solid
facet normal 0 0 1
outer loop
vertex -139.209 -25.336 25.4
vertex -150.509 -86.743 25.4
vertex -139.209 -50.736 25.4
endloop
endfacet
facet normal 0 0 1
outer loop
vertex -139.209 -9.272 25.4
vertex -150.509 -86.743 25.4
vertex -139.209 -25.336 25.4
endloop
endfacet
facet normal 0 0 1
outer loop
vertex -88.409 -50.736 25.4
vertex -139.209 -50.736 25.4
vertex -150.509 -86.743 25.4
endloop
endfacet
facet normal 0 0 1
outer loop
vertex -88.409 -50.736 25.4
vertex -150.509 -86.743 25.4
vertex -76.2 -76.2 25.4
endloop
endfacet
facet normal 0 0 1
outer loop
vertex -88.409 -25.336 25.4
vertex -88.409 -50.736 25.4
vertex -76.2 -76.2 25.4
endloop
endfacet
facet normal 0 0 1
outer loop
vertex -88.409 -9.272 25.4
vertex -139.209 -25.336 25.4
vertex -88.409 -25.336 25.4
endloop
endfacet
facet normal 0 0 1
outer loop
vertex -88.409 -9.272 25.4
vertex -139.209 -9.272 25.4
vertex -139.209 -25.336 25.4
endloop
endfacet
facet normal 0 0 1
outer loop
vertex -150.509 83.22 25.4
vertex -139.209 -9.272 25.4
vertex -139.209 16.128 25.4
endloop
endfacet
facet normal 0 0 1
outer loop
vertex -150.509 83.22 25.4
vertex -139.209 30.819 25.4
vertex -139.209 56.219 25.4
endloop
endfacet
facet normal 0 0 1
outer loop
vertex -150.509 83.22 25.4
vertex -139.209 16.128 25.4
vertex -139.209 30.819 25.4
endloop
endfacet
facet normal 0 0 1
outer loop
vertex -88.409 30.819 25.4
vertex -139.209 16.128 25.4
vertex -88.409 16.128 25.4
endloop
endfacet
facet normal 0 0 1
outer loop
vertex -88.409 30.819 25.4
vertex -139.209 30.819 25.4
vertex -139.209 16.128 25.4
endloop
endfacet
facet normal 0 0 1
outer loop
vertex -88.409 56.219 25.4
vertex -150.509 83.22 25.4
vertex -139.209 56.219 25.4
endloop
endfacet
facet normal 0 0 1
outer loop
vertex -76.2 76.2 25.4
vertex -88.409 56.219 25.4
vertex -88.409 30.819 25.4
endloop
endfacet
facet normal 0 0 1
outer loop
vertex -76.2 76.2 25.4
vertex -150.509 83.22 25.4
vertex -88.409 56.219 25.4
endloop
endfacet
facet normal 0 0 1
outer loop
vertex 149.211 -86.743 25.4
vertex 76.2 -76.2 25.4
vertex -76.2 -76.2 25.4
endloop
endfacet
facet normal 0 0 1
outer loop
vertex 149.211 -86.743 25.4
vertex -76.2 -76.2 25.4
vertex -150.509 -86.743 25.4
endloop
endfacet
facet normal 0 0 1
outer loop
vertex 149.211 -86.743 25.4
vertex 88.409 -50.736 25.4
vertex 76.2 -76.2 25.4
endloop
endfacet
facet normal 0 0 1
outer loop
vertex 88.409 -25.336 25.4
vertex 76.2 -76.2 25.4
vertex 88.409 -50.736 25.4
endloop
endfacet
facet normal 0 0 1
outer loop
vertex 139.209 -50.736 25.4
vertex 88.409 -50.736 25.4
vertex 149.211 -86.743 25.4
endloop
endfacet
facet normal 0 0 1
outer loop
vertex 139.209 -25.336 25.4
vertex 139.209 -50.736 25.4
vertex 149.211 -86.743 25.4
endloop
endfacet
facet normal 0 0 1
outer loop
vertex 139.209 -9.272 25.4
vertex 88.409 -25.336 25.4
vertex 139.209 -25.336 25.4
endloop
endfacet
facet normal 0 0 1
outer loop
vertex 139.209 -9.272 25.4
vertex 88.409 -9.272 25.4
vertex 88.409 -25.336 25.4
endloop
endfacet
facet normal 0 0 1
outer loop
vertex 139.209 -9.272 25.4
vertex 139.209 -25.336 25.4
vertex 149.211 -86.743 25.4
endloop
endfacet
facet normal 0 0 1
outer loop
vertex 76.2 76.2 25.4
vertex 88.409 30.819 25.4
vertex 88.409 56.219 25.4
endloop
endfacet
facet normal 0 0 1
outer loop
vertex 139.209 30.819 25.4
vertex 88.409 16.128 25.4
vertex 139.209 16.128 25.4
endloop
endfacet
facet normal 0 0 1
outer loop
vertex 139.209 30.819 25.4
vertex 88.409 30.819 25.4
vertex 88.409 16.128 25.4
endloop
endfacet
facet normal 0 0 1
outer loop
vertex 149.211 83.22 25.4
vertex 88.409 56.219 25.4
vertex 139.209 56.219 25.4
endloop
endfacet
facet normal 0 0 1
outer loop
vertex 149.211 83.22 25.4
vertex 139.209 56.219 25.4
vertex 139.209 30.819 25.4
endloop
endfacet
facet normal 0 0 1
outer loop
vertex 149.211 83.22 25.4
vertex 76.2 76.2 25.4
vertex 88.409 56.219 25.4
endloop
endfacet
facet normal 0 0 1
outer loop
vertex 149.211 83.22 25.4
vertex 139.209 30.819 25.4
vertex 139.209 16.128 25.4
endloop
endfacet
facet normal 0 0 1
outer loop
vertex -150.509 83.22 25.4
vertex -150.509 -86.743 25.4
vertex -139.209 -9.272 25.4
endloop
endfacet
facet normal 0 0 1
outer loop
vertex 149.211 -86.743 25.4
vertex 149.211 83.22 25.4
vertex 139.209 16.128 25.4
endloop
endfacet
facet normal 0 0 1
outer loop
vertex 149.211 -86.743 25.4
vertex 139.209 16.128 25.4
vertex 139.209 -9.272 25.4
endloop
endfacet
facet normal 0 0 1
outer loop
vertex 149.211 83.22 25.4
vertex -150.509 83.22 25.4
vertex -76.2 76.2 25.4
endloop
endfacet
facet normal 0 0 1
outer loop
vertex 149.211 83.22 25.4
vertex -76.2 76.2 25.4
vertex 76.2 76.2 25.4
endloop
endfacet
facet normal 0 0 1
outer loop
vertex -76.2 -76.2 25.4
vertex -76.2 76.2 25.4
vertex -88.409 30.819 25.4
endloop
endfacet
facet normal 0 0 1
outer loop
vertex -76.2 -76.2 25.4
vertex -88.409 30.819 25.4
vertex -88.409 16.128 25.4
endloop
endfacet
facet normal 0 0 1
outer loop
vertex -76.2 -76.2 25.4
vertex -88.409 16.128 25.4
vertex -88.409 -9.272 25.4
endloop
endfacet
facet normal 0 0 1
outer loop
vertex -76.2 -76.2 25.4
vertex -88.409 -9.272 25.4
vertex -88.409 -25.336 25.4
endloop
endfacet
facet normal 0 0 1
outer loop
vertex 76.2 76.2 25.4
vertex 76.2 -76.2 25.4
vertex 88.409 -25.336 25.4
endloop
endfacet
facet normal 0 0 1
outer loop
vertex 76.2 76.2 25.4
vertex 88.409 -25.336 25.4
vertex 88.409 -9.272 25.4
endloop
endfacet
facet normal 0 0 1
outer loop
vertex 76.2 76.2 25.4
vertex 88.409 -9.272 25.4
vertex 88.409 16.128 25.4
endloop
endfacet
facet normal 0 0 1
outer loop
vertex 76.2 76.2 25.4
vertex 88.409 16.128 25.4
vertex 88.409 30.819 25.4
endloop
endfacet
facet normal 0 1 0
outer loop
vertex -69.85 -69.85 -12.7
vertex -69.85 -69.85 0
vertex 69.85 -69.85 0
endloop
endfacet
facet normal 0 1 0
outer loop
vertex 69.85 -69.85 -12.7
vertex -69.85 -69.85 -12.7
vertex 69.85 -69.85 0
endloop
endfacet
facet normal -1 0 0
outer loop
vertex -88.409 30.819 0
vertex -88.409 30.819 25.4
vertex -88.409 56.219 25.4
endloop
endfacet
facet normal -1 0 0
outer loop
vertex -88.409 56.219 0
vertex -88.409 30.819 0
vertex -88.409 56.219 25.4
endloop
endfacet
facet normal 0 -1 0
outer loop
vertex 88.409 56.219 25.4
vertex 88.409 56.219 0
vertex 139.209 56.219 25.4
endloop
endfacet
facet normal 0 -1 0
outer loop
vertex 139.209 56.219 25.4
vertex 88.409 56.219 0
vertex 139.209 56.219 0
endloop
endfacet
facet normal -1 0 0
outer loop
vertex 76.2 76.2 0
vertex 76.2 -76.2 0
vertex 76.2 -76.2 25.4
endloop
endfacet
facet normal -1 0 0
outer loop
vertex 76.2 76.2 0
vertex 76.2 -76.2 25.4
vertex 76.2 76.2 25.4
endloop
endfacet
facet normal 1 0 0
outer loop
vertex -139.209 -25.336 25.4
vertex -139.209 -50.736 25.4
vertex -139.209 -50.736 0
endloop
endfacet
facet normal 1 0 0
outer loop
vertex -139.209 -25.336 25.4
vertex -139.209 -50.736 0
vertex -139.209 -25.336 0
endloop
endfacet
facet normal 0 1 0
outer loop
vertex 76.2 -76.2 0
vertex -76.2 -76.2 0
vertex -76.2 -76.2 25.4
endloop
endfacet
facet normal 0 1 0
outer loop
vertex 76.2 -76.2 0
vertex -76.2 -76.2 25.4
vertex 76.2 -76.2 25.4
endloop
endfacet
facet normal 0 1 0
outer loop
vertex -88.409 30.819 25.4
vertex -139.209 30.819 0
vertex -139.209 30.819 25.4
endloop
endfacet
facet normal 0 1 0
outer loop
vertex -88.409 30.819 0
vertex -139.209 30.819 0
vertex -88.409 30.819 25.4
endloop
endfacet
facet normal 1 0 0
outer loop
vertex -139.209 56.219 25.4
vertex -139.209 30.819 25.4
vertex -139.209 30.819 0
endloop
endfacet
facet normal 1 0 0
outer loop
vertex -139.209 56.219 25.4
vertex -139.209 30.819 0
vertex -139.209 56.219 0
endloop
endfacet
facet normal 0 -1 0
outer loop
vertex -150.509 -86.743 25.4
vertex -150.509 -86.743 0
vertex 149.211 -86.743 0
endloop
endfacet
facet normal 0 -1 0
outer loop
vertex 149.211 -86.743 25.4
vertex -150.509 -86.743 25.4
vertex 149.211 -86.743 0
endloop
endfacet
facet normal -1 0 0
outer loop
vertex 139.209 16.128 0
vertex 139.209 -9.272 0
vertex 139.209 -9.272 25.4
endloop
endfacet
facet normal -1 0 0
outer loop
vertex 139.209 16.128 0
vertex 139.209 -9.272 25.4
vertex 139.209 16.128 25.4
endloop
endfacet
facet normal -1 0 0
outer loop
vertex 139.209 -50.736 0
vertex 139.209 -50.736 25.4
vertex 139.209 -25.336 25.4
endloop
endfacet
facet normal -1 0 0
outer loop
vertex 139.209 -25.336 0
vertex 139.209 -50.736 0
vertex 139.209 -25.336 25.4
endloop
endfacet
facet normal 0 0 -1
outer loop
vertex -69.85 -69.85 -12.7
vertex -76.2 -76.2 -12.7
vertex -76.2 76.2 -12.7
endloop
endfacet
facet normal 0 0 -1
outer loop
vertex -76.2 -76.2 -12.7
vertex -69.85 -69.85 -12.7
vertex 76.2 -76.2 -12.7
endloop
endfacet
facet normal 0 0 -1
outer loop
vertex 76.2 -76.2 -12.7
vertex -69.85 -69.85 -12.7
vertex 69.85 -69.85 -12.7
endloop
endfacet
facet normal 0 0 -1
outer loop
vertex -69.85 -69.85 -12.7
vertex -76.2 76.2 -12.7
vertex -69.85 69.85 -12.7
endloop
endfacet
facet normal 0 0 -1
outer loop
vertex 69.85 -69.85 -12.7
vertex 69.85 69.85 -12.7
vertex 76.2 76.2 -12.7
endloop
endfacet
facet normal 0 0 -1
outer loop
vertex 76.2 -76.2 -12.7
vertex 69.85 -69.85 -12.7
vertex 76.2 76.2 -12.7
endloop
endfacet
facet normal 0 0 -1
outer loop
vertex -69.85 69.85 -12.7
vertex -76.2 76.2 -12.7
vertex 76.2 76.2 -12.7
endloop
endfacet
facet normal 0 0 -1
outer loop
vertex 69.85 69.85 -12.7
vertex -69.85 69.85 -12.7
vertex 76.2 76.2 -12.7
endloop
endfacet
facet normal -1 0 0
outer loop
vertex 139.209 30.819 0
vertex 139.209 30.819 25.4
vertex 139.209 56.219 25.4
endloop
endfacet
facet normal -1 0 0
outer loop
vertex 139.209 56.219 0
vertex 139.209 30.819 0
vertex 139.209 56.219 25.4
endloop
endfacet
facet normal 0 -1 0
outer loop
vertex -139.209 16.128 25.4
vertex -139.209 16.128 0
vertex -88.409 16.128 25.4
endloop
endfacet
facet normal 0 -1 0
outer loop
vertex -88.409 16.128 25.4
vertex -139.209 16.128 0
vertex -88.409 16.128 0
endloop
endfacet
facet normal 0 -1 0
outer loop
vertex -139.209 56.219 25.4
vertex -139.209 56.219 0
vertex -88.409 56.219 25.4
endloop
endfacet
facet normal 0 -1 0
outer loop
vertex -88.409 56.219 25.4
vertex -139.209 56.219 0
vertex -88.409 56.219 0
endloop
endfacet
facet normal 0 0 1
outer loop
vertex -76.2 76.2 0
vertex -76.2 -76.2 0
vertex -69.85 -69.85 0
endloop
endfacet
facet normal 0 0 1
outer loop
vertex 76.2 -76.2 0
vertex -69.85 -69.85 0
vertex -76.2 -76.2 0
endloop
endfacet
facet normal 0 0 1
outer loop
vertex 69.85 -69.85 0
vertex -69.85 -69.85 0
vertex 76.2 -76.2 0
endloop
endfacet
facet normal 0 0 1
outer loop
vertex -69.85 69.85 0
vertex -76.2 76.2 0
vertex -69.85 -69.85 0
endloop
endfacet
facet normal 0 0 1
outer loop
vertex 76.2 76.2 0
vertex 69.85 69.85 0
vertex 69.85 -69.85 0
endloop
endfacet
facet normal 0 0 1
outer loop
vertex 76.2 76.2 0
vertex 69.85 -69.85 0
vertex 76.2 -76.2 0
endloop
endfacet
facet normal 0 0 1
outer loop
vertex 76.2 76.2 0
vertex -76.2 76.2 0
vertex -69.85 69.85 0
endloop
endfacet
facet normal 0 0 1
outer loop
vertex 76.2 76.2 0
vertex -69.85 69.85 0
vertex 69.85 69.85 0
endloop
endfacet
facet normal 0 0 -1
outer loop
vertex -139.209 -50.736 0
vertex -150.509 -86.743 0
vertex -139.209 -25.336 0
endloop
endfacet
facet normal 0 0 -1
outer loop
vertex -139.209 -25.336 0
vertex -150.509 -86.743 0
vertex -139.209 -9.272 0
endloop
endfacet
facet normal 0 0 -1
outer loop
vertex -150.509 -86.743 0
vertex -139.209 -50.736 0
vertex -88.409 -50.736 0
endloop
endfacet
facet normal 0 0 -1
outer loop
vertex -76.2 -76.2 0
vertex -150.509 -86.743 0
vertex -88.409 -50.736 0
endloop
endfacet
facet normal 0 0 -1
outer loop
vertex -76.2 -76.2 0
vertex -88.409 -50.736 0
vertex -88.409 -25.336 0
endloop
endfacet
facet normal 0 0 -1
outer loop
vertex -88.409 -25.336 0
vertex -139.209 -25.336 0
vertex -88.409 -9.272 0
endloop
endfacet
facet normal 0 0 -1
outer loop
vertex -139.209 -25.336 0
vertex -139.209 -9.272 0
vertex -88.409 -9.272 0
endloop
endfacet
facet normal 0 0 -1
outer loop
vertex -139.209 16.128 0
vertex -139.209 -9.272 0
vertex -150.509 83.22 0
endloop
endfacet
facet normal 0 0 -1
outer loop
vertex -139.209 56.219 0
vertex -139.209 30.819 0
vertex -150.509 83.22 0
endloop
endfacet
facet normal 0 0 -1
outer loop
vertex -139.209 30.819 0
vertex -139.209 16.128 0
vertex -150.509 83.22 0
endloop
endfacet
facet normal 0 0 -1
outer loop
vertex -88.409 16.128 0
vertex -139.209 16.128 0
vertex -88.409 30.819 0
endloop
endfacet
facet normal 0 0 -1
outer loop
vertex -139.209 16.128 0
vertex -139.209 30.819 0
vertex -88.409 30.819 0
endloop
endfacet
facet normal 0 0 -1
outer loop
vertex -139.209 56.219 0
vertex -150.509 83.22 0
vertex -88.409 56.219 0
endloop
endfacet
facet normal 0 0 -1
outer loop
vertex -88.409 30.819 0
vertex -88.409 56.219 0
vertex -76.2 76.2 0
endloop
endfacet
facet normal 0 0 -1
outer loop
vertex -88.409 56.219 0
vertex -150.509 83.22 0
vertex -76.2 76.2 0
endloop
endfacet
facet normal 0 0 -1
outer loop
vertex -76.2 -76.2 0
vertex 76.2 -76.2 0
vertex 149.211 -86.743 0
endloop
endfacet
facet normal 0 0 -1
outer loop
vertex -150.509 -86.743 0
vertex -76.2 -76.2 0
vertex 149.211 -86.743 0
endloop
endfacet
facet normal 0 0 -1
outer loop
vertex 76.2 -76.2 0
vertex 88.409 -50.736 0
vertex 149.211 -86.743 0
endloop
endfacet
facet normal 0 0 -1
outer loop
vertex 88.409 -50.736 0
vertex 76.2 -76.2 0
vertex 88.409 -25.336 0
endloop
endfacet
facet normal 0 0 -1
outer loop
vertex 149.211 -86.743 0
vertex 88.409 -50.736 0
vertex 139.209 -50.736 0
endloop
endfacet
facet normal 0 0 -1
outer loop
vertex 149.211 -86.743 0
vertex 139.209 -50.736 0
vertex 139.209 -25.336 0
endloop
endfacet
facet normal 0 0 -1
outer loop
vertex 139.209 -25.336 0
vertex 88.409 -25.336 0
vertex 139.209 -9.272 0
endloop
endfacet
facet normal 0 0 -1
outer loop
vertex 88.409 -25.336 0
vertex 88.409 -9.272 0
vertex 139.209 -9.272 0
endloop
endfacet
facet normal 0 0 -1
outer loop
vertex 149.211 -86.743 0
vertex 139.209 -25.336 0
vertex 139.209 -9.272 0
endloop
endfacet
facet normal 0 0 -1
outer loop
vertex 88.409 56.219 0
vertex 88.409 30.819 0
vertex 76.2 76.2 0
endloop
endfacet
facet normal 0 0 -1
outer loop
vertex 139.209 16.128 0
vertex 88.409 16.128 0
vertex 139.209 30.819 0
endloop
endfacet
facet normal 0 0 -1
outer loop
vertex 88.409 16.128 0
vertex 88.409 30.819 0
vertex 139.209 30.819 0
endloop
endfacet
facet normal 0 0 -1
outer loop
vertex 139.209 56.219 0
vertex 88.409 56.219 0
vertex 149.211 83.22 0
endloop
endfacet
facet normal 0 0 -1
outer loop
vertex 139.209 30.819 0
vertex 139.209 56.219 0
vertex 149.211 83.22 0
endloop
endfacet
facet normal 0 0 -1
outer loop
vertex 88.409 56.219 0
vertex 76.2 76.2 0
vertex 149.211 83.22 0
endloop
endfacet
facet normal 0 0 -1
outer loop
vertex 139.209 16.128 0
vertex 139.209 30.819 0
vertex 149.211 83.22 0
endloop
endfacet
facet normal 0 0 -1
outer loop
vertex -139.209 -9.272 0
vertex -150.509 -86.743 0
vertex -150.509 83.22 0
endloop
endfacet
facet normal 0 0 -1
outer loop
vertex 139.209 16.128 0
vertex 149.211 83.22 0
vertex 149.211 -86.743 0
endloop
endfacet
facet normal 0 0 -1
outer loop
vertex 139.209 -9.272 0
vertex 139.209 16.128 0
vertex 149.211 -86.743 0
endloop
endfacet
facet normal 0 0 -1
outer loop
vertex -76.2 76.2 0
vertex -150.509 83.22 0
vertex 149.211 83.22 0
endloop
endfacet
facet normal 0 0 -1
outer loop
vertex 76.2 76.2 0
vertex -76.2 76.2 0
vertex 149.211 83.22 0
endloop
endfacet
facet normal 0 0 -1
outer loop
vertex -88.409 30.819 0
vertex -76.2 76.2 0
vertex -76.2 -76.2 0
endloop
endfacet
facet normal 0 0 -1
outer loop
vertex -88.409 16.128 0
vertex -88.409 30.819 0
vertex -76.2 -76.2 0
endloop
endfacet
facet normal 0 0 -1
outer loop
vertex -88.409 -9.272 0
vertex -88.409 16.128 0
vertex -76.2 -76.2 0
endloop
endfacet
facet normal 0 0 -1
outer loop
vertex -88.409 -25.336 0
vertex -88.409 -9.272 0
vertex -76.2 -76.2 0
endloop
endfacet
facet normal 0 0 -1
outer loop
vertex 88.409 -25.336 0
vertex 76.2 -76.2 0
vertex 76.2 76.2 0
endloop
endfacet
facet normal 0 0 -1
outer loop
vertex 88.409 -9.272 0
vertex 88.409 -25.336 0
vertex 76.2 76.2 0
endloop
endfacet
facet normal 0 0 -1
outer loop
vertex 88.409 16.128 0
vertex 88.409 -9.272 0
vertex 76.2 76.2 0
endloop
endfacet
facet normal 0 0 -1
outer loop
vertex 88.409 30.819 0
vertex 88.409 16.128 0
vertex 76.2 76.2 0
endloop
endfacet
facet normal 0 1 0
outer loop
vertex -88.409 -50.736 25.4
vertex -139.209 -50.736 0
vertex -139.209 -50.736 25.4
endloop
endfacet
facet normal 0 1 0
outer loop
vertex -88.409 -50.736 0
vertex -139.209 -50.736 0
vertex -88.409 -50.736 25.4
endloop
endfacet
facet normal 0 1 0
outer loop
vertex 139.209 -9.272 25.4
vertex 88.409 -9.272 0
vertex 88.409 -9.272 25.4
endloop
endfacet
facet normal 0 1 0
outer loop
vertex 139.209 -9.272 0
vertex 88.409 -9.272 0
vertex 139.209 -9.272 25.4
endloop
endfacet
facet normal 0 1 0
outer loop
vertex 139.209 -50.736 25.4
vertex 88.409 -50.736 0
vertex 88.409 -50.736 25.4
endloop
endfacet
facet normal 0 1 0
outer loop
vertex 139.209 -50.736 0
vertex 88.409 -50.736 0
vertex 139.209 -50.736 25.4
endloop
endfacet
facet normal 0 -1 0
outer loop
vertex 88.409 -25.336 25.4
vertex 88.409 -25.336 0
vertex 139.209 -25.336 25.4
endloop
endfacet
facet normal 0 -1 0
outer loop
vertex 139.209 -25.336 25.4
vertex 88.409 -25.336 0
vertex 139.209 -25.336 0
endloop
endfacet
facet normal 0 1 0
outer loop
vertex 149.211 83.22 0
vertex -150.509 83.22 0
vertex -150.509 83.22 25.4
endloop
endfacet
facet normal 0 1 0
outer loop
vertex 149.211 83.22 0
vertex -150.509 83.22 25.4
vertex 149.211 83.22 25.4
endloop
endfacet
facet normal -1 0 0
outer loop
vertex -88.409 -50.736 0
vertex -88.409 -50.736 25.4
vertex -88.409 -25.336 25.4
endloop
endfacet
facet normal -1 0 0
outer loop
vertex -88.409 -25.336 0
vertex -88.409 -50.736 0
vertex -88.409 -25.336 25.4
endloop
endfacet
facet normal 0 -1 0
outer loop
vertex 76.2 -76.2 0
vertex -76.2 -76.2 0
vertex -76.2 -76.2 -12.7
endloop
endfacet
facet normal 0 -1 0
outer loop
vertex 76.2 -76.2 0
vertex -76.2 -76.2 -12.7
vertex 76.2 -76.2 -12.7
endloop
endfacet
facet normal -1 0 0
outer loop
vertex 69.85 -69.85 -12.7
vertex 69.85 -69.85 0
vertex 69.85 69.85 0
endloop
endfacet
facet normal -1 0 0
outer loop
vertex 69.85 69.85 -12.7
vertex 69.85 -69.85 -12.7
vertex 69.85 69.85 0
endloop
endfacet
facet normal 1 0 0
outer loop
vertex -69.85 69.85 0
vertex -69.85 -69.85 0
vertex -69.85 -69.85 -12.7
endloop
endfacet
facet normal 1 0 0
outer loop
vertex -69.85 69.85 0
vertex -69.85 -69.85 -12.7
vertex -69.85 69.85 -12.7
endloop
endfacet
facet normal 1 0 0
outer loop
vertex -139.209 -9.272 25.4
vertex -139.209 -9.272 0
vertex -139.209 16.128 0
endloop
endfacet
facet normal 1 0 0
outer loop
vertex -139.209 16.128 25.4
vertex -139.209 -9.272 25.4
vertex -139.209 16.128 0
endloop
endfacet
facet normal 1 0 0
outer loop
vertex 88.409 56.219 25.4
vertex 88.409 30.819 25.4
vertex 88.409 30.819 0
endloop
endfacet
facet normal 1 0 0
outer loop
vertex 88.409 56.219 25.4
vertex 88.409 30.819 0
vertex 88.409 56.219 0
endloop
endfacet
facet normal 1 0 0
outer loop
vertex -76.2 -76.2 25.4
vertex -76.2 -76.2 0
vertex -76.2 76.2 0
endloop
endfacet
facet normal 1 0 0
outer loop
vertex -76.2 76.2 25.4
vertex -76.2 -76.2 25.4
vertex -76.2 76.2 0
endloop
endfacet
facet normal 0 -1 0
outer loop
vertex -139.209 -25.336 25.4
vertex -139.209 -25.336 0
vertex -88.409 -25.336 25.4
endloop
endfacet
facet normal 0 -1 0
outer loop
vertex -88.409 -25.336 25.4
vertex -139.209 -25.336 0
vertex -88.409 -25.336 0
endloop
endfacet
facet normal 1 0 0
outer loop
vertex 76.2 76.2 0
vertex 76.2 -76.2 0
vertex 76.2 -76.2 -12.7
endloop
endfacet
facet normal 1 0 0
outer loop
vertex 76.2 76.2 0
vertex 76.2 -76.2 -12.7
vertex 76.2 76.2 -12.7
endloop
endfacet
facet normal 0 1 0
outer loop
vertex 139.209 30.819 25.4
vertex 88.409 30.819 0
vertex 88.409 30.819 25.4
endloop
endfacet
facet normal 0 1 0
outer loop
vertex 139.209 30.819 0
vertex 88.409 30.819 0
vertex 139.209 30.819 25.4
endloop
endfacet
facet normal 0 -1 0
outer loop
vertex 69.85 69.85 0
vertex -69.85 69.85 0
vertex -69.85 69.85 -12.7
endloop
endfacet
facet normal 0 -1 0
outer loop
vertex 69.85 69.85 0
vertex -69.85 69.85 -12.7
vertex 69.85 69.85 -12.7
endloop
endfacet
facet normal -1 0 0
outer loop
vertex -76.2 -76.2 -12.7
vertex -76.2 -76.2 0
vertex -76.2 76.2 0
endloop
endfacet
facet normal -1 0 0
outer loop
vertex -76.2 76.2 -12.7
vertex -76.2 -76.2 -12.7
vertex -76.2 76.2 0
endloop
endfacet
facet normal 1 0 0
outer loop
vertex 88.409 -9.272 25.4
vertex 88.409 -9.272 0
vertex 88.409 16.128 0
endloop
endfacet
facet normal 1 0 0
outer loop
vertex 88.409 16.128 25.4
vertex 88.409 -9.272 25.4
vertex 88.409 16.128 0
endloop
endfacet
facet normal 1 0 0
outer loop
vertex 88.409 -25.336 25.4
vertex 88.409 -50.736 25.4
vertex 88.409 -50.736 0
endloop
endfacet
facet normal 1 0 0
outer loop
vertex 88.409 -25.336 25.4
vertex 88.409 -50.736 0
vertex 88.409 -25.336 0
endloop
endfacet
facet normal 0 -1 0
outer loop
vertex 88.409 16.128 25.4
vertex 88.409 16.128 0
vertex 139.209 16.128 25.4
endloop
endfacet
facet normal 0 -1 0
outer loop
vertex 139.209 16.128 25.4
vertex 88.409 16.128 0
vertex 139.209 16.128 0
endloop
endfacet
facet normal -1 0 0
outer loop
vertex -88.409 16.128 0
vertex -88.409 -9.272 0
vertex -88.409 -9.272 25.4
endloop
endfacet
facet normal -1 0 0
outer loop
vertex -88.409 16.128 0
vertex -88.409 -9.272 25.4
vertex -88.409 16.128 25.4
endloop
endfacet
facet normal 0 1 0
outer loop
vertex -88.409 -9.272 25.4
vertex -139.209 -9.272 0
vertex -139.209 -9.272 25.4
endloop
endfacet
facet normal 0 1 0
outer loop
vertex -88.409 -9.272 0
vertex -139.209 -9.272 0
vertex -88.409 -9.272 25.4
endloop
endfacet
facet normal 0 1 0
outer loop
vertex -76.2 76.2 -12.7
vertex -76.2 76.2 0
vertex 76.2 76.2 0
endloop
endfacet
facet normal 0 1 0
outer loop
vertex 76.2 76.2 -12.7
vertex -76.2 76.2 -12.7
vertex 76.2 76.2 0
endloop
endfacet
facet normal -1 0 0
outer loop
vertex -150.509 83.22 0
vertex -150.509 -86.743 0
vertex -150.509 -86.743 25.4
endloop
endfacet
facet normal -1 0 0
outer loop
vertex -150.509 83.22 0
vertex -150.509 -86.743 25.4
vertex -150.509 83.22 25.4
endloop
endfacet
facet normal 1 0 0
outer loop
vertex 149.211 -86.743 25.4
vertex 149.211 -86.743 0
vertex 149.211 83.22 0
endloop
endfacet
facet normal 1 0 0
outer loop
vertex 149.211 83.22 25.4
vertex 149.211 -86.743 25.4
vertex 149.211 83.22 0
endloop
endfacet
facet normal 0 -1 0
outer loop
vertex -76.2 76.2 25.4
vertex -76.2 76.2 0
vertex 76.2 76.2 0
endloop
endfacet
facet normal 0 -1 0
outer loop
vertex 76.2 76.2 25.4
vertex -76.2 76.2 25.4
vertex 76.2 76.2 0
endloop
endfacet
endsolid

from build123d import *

# Parameters (mm, degrees)
F0_W     = 299.72
F0_H     = 169.9631744818
F3_DEPTH = 25.4
F1_W     = 50.8
F1_H     = 25.4
F4_DEPTH = 25.4
F2_W     = 152.4
F2_H     = 152.4
F2_W_2   = 139.7
F2_H_2   = 139.7
F5_DEPTH = 25.4
F6_DEPTH = 12.7


# Not quite as in the source:
# - a feature of the source that left no trace in its solid (it failed there, or was rolled back) is left out


with BuildPart() as f3:
    # F0 (on Top) → F3 (new body)
    with BuildSketch(Plane.XY):
        with Locations((-0.6489809602, -1.7615165561)):
            Rectangle(F0_W, F0_H)
    extrude(amount=F3_DEPTH)

    # F1 (on face) → F4 (cut)
    with BuildSketch(Plane.XY):
        with Locations((113.8091359086, 43.5188937416)):
            Rectangle(F1_W, F1_H)
        with Locations((113.8091359086, 3.428083711)):
            Rectangle(F1_W, F1_H)
        with Locations((113.8091359086, -38.0356973421)):
            Rectangle(F1_W, F1_H)
        with Locations((-113.8091359086, 43.5188937416)):
            Rectangle(F1_W, F1_H)
        with Locations((-113.8091359086, 3.428083711)):
            Rectangle(F1_W, F1_H)
        with Locations((-113.8091359086, -38.0356973421)):
            Rectangle(F1_W, F1_H)
    extrude(amount=F4_DEPTH, mode=Mode.SUBTRACT)

    # F2 (on Top) → F5 (cut)
    with BuildSketch(Plane.XY):
        Rectangle(F2_W, F2_H)
        Rectangle(F2_W_2, F2_H_2, mode=Mode.SUBTRACT)
        Rectangle(F2_W_2, F2_H_2)
    extrude(amount=F5_DEPTH, mode=Mode.SUBTRACT)


with BuildPart() as f6:
    # F2 (on Top) → F6 (new body)
    with BuildSketch(Plane.XY):
        Rectangle(F2_W, F2_H)
        Rectangle(F2_W_2, F2_H_2, mode=Mode.SUBTRACT)
    extrude(amount=-F6_DEPTH)


solid = Compound([f3.part, f6.part])
